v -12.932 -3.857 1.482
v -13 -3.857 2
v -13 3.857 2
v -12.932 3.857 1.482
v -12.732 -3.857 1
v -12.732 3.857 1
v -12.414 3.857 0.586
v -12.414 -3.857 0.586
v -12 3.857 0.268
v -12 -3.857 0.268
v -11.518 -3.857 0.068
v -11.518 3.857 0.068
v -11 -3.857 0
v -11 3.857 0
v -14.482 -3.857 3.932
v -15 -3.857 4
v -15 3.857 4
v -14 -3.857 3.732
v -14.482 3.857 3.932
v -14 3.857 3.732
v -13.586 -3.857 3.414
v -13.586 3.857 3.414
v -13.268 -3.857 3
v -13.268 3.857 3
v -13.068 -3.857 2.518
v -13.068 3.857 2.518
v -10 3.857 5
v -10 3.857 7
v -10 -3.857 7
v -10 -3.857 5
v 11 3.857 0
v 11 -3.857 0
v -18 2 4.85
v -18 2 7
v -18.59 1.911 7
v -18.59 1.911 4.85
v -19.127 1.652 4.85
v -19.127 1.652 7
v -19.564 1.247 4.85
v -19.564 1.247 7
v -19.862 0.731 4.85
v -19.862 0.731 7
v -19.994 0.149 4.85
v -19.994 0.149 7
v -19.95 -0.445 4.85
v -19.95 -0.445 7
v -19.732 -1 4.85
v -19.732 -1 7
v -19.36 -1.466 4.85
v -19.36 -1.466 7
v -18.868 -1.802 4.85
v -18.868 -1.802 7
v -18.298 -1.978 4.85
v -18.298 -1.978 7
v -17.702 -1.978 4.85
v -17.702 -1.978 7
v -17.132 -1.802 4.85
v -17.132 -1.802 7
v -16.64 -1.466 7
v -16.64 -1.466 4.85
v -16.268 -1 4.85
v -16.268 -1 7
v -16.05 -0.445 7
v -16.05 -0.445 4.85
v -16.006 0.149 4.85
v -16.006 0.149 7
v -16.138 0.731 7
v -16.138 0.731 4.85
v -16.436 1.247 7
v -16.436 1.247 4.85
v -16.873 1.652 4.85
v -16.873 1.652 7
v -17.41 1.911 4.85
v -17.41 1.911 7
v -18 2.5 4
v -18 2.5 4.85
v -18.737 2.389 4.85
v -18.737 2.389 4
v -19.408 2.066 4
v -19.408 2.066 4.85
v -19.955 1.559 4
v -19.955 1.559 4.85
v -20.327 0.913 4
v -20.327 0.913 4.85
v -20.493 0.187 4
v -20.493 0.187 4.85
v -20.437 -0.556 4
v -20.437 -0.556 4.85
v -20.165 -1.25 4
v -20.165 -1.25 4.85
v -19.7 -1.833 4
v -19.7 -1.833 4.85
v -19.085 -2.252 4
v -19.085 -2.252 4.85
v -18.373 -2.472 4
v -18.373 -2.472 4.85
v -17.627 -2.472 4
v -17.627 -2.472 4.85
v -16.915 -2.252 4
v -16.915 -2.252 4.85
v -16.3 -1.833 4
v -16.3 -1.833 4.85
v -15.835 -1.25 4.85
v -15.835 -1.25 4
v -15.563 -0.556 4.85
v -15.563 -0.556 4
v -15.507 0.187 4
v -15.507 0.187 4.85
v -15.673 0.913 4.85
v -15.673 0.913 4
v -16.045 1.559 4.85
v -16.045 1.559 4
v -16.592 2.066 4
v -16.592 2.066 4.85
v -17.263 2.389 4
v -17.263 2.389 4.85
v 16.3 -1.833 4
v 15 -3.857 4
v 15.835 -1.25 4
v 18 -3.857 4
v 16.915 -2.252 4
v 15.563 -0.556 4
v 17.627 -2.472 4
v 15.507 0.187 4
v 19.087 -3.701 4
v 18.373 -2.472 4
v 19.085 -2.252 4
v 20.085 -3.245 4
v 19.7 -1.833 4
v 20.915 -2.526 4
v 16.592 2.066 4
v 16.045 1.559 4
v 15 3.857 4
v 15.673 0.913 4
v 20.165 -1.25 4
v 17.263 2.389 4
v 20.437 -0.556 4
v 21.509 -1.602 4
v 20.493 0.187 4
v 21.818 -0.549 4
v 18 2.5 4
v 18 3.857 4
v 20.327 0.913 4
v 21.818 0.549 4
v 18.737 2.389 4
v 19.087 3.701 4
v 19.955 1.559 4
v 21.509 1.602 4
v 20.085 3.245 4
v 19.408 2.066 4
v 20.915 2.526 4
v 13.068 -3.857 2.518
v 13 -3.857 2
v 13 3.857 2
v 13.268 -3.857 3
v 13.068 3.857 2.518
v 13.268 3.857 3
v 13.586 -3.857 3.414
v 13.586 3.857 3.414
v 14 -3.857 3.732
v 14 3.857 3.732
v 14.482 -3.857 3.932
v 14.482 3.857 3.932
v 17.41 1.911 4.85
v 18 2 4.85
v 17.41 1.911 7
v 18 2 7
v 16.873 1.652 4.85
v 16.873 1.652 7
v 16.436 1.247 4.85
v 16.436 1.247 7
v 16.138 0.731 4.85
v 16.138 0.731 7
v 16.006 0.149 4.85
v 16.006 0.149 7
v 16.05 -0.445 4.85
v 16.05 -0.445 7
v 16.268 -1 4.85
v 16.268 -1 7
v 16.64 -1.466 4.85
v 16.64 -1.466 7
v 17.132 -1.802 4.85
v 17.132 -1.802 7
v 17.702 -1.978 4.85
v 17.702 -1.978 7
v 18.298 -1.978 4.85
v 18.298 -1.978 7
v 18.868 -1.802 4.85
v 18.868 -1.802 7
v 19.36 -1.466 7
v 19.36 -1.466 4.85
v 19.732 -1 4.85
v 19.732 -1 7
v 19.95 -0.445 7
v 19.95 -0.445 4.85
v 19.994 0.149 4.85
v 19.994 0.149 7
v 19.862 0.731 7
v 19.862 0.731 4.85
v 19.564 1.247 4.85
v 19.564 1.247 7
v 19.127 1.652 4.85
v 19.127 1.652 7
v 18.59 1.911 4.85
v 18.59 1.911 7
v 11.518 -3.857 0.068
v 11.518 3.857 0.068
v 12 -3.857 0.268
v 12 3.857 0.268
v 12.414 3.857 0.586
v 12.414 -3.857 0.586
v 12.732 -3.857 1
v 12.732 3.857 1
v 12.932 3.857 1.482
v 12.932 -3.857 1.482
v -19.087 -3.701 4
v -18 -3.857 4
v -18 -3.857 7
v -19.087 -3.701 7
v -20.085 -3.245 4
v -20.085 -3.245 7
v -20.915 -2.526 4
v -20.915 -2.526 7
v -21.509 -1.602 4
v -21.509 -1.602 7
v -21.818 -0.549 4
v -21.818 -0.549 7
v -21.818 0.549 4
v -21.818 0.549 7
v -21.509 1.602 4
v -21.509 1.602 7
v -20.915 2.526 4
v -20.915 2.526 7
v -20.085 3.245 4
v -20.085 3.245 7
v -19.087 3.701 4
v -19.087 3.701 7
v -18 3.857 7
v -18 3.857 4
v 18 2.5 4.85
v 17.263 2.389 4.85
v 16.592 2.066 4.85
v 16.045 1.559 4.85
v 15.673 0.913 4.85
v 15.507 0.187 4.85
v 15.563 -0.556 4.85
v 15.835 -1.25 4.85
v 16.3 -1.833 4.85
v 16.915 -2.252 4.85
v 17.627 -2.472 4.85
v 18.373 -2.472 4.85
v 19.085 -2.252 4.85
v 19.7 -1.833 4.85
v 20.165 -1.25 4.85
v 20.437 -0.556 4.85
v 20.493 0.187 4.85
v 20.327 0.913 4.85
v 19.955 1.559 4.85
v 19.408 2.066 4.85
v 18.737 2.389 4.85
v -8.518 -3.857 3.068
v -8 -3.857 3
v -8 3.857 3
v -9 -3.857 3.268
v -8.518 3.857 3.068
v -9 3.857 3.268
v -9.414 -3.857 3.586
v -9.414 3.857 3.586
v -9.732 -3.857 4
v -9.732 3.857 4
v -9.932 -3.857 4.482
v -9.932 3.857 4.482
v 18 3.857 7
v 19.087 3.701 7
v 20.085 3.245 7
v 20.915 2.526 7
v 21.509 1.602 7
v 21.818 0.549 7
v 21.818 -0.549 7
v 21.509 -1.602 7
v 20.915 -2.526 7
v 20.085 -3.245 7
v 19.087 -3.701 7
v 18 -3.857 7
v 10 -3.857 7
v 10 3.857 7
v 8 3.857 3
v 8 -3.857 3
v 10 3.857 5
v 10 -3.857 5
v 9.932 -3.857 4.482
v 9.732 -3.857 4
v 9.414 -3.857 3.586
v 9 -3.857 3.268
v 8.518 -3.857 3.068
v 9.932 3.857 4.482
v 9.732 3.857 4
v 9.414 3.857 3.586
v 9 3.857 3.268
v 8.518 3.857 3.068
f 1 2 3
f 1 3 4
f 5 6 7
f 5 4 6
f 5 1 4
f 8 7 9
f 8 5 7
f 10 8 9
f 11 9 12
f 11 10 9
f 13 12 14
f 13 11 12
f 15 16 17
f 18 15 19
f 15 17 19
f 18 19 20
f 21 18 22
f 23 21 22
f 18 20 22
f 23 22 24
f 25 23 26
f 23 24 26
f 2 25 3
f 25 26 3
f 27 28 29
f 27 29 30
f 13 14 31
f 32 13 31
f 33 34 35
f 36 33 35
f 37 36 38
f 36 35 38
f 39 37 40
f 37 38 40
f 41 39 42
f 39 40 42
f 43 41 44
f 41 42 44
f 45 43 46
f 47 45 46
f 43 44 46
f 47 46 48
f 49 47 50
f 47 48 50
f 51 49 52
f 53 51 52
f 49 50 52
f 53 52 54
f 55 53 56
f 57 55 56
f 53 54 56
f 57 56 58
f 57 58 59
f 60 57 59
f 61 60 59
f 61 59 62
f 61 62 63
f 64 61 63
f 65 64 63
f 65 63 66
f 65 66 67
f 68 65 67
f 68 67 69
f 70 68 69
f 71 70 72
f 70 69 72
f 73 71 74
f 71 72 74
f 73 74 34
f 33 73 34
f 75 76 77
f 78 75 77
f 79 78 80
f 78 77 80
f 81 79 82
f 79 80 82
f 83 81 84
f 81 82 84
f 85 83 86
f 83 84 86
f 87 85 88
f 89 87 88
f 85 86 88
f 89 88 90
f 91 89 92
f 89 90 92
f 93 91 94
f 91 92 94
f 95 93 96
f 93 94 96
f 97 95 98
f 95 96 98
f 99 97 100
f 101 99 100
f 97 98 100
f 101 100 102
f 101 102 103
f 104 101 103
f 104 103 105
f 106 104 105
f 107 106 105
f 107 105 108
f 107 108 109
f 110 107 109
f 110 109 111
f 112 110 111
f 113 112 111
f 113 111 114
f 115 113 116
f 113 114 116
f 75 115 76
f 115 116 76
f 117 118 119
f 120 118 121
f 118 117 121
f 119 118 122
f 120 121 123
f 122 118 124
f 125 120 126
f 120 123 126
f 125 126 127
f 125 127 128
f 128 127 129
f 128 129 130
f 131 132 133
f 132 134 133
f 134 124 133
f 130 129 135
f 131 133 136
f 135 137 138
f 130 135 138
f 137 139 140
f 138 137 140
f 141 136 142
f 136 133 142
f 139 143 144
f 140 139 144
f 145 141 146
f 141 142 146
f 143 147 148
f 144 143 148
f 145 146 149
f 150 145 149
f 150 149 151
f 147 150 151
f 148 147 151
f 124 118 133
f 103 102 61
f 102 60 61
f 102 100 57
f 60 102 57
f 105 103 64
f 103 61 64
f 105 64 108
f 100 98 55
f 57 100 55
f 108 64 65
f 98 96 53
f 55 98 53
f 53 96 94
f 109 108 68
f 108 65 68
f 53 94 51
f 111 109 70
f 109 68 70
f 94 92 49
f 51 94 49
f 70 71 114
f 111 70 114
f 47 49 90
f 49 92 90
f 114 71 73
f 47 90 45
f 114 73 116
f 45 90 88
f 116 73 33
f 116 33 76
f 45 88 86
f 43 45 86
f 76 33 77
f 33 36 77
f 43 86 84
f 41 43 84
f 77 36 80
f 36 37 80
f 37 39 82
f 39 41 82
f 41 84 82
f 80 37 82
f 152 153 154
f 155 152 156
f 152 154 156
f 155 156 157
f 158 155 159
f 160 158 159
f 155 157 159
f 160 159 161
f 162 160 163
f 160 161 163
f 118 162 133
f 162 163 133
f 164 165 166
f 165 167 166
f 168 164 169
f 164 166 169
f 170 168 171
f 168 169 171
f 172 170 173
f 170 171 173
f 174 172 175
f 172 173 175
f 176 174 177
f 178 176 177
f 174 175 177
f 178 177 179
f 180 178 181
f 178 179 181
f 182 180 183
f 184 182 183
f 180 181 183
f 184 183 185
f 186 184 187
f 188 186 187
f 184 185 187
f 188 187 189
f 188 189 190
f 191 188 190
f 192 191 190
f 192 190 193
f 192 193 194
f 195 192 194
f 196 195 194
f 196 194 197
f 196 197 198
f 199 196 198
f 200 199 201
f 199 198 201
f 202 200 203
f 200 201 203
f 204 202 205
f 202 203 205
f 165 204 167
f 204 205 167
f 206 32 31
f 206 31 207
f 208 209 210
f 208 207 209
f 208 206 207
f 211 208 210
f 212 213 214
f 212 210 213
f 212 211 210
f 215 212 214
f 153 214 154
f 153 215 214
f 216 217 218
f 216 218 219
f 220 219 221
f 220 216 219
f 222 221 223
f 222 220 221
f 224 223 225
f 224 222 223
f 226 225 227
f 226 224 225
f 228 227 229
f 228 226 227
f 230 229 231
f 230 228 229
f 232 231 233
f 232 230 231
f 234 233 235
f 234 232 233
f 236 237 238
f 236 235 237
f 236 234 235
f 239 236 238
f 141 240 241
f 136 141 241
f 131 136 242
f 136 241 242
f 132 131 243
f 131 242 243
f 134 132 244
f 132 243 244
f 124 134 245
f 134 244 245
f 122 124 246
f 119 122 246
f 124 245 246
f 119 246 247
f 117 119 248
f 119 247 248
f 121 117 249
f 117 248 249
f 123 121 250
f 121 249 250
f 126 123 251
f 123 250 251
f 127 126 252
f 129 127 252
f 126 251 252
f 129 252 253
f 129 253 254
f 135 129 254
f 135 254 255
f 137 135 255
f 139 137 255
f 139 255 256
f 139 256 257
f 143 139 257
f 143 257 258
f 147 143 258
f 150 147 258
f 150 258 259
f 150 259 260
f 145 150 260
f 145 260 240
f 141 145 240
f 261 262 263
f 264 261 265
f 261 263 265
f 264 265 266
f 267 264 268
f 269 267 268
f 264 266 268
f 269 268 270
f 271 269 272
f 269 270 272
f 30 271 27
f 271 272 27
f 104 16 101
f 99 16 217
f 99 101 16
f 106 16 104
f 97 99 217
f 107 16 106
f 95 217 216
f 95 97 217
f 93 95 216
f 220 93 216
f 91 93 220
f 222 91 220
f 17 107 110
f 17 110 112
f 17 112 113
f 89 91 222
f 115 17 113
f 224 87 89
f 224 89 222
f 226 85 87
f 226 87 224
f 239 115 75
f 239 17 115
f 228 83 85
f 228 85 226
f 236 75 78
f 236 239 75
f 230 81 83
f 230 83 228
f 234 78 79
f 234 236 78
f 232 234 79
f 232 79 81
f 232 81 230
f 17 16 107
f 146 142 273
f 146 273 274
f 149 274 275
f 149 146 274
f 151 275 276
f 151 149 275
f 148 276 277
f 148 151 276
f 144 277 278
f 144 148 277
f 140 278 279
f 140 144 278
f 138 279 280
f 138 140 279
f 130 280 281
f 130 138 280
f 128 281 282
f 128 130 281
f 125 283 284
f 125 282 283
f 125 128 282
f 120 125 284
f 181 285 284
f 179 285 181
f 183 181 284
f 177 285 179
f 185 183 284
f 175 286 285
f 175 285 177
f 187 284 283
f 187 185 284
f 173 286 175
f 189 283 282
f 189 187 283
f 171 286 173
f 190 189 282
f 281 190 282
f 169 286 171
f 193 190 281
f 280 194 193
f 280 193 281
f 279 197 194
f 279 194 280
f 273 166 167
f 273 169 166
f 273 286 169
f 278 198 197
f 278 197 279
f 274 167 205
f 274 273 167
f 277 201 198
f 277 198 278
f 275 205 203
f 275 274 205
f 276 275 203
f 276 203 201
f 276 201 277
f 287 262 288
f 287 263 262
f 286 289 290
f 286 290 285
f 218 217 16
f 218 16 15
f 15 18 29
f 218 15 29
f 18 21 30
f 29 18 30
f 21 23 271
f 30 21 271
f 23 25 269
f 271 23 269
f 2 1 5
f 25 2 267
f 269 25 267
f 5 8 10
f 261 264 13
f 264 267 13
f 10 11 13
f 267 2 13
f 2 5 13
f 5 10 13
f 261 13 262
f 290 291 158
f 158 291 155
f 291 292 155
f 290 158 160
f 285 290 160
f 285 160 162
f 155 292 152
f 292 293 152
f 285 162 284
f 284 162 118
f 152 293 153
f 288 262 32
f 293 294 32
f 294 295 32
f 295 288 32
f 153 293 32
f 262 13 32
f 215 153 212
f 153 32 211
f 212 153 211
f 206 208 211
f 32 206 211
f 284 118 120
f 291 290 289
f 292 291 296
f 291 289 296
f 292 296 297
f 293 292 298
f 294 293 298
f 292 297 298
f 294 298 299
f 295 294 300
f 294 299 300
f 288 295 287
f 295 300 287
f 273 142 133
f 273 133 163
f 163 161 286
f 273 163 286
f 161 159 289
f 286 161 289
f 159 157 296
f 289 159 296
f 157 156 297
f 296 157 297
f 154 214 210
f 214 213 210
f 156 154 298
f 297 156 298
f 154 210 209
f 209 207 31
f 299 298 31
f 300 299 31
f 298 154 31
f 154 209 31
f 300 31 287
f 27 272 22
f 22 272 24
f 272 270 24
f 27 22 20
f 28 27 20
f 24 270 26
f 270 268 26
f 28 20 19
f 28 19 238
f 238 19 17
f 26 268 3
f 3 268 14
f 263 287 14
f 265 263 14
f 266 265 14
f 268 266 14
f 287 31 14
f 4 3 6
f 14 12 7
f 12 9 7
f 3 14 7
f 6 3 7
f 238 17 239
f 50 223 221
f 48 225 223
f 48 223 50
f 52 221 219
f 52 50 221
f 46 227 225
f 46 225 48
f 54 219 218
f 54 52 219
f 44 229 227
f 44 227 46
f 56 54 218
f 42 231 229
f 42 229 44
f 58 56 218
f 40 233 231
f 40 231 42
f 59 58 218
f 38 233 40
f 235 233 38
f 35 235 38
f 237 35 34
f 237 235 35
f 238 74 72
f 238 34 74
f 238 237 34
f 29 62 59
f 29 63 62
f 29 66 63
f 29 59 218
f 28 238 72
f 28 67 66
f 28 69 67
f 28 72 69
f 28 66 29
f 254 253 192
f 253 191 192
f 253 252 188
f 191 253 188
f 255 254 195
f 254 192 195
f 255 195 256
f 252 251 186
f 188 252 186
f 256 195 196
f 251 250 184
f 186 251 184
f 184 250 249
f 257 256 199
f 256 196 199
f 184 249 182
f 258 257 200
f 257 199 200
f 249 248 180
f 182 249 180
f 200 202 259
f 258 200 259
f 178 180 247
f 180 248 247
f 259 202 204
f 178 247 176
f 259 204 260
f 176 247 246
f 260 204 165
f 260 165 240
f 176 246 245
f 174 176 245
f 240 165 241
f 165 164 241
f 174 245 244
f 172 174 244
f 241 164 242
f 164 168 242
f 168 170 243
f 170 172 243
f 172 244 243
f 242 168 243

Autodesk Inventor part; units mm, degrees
ref_plane "YZ Plane" through (0, 0, 0) normal (1, 0, 0) x (0, 1, 0)
ref_plane "XZ Plane" through (0, 0, 0) normal (0, 1, 0) x (-1, 0, 0)
ref_plane "XY Plane" through (0, 0, 0) normal (0, 0, 1) x (1, 0, 0)
sketch "Sketch1" plane through (0, 0, 0) normal (0, 0, 1) x (1, 0, 0)
  line L0 (-18, 0) -> (18, 0) construction
  arc A0 (-18, 3.8571) -> (-18, -3.8571) centre (-18, 0) ccw
  arc A1 (18, -3.8571) -> (18, 3.8571) centre (18, 0) ccw
  line L1 (-18, -3.8571) -> (18, -3.8571)
  line L2 (18, 3.8571) -> (-18, 3.8571)
  point P0 (0, 0)
  dimension "d26" = 36
extrude "Extrusion1" add sketch "Sketch1" along normal blind 7
sketch "Sketch2" plane through (-18, 3.8571, 0) normal (0, 1, 0) x (1, 0, 0)
  line L0 (33, -4) -> (50.7344, -4) construction
  line L1 (36, -7) -> (0, -7) projected
  line L2 (10, -3) -> (26, -3)
  line L3 (28, -5) -> (28, -7)
  line L4 (28, -7) -> (8, -7)
  line L5 (8, -7) -> (8, -5)
  line L6 (36, 0) -> (0, 0) projected
  line L7 (0, 0) -> (0, -7) projected
  line L8 (36, 0) -> (36, -7) projected
  line L9 (3, -4) -> (-4.7246, -4)
  line L10 (-4.7246, -4) -> (-4.7246, 3)
  line L11 (-4.7246, 3) -> (5, 3)
  line L12 (5, 3) -> (5, -2)
  line L13 (33, -4) -> (47.7116, -4)
  line L14 (47.7116, -4) -> (47.7116, 0.5212)
  line L15 (47.7116, 0.5212) -> (31, 0.5212)
  line L16 (31, 0.5212) -> (31, -2)
  arc A0 (3, -4) -> (5, -2) centre (3, -2) ccw
  arc A1 (10, -3) -> (8, -5) centre (10, -5) ccw
  arc A2 (28, -5) -> (26, -3) centre (26, -5) ccw
  arc A3 (31, -2) -> (33, -4) centre (33, -2) ccw
  point P0 (18, 0)
  point P1 (8, -3)
  point P2 (28, -3)
  point P3 (5, -4)
  dimension "d7" = 3
  dimension "d8" = 8
  dimension "d9" = 8
  dimension "d10" = 3
  dimension "d11" = 3
  dimension "d24" = 2
extrude "Extrusion2" cut sketch "Sketch2" against normal blind 10 contours L1 L5 A1 L2 A2 L3 | L13 A3 L16 L6 L8 | L8 L6 L16 L15 L14 L13 | L9 L10 L11 L12 L6 L7 | L7 L6 L12 A0 L9
sketch "Sketch3" plane through (0, 0, 7) normal (0, 0, 1) x (1, 0, 0)
  arc A0 (-18, 3.8571) -> (-18, -3.8571) centre (-18, 0) ccw projected
  point P0 (0, 0)
sketch "Sketch4" plane through (-13, 3.8571, 4) normal (0, 0, -1) x (-1, 0, 0)
  arc A0 (5, -7.7143) -> (5, 0) centre (5, -3.8571) ccw projected
  point P0 (-13, -3.8571)
hole "Hole1" at (-18, 0, 4) direction (0, 0, 1) diameter 4 depth 3 tip angle 118 counterbore diameter 5 counterbore depth 0.85
pattern_linear "Rectangular Pattern1" count 2 spacing 36 along (1, 0, 0) of "Hole1"
fillet "Fillet1" radius 2 2 edges at (13, 0, 0) (-13, 0, 0)
properties part number "opencm_strap"
